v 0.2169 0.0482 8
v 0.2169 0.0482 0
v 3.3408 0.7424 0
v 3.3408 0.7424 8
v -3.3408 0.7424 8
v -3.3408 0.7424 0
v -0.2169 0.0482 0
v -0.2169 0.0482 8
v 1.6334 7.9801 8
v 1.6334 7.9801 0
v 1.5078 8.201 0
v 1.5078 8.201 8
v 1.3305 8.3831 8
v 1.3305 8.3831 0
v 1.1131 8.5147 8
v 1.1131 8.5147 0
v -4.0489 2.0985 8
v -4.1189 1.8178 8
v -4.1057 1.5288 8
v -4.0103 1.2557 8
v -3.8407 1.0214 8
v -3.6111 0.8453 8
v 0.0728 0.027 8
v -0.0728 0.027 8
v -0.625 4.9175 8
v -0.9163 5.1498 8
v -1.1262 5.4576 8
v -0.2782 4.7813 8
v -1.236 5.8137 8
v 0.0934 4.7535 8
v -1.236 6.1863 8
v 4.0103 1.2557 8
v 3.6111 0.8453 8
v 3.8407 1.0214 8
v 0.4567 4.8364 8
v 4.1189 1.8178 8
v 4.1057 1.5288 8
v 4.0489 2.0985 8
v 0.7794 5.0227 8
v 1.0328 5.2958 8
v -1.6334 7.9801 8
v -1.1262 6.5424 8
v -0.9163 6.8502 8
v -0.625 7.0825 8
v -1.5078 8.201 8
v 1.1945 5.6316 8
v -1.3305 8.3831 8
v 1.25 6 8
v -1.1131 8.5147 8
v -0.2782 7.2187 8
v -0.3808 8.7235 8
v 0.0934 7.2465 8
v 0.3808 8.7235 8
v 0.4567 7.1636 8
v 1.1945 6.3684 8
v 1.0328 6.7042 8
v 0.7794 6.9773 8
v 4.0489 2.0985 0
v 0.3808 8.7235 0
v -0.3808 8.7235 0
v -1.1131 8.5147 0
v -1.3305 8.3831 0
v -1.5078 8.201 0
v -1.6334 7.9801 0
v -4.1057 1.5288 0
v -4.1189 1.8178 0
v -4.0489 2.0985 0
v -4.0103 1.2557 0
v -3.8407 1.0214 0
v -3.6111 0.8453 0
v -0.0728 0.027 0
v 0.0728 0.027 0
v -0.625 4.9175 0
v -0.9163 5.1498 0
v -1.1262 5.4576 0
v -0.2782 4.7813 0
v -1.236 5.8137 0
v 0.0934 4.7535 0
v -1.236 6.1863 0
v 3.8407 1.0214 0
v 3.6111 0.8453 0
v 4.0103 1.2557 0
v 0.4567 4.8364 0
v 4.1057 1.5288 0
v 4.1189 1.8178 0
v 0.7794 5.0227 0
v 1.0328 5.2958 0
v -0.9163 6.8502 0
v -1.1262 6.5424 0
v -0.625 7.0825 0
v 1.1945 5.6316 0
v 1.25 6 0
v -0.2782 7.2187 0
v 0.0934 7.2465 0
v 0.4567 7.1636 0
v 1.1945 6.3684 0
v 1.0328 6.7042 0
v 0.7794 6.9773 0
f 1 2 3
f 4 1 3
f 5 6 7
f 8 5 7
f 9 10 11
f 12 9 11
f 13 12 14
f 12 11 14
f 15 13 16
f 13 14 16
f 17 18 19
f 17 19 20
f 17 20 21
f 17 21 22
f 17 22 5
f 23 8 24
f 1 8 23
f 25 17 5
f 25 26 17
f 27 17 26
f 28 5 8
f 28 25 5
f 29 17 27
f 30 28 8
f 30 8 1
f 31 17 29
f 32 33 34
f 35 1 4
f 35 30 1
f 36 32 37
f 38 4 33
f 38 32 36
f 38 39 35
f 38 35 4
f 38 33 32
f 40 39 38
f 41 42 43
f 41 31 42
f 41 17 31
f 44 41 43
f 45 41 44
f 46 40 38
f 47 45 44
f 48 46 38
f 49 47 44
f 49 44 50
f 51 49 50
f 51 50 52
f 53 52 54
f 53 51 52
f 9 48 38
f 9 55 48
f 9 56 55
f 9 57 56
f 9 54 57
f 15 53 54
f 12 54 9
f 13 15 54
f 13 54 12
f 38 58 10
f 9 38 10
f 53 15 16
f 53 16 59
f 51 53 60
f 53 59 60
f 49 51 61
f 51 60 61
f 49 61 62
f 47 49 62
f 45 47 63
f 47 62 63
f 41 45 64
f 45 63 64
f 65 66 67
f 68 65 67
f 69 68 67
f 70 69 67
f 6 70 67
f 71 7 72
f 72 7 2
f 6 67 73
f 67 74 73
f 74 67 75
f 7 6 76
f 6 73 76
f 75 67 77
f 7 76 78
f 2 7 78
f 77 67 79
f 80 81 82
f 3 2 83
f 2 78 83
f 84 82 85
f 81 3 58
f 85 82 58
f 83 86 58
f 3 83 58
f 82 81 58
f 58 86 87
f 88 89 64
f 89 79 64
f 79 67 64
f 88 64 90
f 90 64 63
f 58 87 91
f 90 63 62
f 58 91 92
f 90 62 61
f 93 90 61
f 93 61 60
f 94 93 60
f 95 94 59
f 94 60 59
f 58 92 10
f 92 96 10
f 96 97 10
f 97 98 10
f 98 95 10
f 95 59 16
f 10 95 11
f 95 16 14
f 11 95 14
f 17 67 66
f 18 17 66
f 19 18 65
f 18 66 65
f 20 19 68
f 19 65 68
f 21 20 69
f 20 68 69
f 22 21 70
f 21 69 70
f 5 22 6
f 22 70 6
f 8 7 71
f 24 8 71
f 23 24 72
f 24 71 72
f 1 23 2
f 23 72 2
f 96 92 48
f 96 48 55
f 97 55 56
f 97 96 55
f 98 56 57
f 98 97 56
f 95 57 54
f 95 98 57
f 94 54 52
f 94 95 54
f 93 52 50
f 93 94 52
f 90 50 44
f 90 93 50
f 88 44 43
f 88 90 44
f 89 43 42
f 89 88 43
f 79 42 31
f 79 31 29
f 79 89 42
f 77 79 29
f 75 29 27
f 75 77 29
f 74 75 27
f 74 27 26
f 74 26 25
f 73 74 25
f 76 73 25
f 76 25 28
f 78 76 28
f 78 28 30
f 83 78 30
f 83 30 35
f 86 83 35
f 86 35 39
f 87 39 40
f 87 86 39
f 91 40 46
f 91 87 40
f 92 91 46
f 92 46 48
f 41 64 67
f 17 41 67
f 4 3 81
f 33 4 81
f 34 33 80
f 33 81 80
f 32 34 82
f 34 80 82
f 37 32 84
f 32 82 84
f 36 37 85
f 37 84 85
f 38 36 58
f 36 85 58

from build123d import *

# Parameters (mm, degrees)
SZKIC1_R                    = 1.25
DODANIE_WYCI_GNI_CIE1_DEPTH = 8


with BuildPart() as part:
    # Szkic1 → Dodanie-wyciągnięcie1 (new body)
    with BuildSketch(Plane.XY):
        with BuildLine():
            Line((0.216930458, 0.048206768), (3.340774171, 0.74239426))
            ThreePointArc((3.340774171, 0.74239426), (4.010273516, 1.255718269), (4.04887337, 2.098476219))
            Line((4.04887337, 2.098476219), (1.633372376, 7.980129441))
            ThreePointArc((1.633372376, 7.980129441), (1.424945236, 8.297716323), (1.113109988, 8.514654282))
            ThreePointArc((1.113109988, 8.514654282), (0, 8.75), (-1.113109988, 8.514654282))
            ThreePointArc((-1.113109988, 8.514654282), (-1.424945236, 8.297716323), (-1.633372376, 7.980129441))
            Line((-1.633372376, 7.980129441), (-4.04887337, 2.098476219))
            ThreePointArc((-4.04887337, 2.098476219), (-4.010273516, 1.255718269), (-3.340774171, 0.74239426))
            Line((-3.340774171, 0.74239426), (-0.216930458, 0.048206768))
            ThreePointArc((-0.216930458, 0.048206768), (0, 0.024393829), (0.216930458, 0.048206768))
        make_face()
        with Locations((0, 6)):
            Circle(SZKIC1_R, mode=Mode.SUBTRACT)
    extrude(amount=DODANIE_WYCI_GNI_CIE1_DEPTH)


solid = part.part
